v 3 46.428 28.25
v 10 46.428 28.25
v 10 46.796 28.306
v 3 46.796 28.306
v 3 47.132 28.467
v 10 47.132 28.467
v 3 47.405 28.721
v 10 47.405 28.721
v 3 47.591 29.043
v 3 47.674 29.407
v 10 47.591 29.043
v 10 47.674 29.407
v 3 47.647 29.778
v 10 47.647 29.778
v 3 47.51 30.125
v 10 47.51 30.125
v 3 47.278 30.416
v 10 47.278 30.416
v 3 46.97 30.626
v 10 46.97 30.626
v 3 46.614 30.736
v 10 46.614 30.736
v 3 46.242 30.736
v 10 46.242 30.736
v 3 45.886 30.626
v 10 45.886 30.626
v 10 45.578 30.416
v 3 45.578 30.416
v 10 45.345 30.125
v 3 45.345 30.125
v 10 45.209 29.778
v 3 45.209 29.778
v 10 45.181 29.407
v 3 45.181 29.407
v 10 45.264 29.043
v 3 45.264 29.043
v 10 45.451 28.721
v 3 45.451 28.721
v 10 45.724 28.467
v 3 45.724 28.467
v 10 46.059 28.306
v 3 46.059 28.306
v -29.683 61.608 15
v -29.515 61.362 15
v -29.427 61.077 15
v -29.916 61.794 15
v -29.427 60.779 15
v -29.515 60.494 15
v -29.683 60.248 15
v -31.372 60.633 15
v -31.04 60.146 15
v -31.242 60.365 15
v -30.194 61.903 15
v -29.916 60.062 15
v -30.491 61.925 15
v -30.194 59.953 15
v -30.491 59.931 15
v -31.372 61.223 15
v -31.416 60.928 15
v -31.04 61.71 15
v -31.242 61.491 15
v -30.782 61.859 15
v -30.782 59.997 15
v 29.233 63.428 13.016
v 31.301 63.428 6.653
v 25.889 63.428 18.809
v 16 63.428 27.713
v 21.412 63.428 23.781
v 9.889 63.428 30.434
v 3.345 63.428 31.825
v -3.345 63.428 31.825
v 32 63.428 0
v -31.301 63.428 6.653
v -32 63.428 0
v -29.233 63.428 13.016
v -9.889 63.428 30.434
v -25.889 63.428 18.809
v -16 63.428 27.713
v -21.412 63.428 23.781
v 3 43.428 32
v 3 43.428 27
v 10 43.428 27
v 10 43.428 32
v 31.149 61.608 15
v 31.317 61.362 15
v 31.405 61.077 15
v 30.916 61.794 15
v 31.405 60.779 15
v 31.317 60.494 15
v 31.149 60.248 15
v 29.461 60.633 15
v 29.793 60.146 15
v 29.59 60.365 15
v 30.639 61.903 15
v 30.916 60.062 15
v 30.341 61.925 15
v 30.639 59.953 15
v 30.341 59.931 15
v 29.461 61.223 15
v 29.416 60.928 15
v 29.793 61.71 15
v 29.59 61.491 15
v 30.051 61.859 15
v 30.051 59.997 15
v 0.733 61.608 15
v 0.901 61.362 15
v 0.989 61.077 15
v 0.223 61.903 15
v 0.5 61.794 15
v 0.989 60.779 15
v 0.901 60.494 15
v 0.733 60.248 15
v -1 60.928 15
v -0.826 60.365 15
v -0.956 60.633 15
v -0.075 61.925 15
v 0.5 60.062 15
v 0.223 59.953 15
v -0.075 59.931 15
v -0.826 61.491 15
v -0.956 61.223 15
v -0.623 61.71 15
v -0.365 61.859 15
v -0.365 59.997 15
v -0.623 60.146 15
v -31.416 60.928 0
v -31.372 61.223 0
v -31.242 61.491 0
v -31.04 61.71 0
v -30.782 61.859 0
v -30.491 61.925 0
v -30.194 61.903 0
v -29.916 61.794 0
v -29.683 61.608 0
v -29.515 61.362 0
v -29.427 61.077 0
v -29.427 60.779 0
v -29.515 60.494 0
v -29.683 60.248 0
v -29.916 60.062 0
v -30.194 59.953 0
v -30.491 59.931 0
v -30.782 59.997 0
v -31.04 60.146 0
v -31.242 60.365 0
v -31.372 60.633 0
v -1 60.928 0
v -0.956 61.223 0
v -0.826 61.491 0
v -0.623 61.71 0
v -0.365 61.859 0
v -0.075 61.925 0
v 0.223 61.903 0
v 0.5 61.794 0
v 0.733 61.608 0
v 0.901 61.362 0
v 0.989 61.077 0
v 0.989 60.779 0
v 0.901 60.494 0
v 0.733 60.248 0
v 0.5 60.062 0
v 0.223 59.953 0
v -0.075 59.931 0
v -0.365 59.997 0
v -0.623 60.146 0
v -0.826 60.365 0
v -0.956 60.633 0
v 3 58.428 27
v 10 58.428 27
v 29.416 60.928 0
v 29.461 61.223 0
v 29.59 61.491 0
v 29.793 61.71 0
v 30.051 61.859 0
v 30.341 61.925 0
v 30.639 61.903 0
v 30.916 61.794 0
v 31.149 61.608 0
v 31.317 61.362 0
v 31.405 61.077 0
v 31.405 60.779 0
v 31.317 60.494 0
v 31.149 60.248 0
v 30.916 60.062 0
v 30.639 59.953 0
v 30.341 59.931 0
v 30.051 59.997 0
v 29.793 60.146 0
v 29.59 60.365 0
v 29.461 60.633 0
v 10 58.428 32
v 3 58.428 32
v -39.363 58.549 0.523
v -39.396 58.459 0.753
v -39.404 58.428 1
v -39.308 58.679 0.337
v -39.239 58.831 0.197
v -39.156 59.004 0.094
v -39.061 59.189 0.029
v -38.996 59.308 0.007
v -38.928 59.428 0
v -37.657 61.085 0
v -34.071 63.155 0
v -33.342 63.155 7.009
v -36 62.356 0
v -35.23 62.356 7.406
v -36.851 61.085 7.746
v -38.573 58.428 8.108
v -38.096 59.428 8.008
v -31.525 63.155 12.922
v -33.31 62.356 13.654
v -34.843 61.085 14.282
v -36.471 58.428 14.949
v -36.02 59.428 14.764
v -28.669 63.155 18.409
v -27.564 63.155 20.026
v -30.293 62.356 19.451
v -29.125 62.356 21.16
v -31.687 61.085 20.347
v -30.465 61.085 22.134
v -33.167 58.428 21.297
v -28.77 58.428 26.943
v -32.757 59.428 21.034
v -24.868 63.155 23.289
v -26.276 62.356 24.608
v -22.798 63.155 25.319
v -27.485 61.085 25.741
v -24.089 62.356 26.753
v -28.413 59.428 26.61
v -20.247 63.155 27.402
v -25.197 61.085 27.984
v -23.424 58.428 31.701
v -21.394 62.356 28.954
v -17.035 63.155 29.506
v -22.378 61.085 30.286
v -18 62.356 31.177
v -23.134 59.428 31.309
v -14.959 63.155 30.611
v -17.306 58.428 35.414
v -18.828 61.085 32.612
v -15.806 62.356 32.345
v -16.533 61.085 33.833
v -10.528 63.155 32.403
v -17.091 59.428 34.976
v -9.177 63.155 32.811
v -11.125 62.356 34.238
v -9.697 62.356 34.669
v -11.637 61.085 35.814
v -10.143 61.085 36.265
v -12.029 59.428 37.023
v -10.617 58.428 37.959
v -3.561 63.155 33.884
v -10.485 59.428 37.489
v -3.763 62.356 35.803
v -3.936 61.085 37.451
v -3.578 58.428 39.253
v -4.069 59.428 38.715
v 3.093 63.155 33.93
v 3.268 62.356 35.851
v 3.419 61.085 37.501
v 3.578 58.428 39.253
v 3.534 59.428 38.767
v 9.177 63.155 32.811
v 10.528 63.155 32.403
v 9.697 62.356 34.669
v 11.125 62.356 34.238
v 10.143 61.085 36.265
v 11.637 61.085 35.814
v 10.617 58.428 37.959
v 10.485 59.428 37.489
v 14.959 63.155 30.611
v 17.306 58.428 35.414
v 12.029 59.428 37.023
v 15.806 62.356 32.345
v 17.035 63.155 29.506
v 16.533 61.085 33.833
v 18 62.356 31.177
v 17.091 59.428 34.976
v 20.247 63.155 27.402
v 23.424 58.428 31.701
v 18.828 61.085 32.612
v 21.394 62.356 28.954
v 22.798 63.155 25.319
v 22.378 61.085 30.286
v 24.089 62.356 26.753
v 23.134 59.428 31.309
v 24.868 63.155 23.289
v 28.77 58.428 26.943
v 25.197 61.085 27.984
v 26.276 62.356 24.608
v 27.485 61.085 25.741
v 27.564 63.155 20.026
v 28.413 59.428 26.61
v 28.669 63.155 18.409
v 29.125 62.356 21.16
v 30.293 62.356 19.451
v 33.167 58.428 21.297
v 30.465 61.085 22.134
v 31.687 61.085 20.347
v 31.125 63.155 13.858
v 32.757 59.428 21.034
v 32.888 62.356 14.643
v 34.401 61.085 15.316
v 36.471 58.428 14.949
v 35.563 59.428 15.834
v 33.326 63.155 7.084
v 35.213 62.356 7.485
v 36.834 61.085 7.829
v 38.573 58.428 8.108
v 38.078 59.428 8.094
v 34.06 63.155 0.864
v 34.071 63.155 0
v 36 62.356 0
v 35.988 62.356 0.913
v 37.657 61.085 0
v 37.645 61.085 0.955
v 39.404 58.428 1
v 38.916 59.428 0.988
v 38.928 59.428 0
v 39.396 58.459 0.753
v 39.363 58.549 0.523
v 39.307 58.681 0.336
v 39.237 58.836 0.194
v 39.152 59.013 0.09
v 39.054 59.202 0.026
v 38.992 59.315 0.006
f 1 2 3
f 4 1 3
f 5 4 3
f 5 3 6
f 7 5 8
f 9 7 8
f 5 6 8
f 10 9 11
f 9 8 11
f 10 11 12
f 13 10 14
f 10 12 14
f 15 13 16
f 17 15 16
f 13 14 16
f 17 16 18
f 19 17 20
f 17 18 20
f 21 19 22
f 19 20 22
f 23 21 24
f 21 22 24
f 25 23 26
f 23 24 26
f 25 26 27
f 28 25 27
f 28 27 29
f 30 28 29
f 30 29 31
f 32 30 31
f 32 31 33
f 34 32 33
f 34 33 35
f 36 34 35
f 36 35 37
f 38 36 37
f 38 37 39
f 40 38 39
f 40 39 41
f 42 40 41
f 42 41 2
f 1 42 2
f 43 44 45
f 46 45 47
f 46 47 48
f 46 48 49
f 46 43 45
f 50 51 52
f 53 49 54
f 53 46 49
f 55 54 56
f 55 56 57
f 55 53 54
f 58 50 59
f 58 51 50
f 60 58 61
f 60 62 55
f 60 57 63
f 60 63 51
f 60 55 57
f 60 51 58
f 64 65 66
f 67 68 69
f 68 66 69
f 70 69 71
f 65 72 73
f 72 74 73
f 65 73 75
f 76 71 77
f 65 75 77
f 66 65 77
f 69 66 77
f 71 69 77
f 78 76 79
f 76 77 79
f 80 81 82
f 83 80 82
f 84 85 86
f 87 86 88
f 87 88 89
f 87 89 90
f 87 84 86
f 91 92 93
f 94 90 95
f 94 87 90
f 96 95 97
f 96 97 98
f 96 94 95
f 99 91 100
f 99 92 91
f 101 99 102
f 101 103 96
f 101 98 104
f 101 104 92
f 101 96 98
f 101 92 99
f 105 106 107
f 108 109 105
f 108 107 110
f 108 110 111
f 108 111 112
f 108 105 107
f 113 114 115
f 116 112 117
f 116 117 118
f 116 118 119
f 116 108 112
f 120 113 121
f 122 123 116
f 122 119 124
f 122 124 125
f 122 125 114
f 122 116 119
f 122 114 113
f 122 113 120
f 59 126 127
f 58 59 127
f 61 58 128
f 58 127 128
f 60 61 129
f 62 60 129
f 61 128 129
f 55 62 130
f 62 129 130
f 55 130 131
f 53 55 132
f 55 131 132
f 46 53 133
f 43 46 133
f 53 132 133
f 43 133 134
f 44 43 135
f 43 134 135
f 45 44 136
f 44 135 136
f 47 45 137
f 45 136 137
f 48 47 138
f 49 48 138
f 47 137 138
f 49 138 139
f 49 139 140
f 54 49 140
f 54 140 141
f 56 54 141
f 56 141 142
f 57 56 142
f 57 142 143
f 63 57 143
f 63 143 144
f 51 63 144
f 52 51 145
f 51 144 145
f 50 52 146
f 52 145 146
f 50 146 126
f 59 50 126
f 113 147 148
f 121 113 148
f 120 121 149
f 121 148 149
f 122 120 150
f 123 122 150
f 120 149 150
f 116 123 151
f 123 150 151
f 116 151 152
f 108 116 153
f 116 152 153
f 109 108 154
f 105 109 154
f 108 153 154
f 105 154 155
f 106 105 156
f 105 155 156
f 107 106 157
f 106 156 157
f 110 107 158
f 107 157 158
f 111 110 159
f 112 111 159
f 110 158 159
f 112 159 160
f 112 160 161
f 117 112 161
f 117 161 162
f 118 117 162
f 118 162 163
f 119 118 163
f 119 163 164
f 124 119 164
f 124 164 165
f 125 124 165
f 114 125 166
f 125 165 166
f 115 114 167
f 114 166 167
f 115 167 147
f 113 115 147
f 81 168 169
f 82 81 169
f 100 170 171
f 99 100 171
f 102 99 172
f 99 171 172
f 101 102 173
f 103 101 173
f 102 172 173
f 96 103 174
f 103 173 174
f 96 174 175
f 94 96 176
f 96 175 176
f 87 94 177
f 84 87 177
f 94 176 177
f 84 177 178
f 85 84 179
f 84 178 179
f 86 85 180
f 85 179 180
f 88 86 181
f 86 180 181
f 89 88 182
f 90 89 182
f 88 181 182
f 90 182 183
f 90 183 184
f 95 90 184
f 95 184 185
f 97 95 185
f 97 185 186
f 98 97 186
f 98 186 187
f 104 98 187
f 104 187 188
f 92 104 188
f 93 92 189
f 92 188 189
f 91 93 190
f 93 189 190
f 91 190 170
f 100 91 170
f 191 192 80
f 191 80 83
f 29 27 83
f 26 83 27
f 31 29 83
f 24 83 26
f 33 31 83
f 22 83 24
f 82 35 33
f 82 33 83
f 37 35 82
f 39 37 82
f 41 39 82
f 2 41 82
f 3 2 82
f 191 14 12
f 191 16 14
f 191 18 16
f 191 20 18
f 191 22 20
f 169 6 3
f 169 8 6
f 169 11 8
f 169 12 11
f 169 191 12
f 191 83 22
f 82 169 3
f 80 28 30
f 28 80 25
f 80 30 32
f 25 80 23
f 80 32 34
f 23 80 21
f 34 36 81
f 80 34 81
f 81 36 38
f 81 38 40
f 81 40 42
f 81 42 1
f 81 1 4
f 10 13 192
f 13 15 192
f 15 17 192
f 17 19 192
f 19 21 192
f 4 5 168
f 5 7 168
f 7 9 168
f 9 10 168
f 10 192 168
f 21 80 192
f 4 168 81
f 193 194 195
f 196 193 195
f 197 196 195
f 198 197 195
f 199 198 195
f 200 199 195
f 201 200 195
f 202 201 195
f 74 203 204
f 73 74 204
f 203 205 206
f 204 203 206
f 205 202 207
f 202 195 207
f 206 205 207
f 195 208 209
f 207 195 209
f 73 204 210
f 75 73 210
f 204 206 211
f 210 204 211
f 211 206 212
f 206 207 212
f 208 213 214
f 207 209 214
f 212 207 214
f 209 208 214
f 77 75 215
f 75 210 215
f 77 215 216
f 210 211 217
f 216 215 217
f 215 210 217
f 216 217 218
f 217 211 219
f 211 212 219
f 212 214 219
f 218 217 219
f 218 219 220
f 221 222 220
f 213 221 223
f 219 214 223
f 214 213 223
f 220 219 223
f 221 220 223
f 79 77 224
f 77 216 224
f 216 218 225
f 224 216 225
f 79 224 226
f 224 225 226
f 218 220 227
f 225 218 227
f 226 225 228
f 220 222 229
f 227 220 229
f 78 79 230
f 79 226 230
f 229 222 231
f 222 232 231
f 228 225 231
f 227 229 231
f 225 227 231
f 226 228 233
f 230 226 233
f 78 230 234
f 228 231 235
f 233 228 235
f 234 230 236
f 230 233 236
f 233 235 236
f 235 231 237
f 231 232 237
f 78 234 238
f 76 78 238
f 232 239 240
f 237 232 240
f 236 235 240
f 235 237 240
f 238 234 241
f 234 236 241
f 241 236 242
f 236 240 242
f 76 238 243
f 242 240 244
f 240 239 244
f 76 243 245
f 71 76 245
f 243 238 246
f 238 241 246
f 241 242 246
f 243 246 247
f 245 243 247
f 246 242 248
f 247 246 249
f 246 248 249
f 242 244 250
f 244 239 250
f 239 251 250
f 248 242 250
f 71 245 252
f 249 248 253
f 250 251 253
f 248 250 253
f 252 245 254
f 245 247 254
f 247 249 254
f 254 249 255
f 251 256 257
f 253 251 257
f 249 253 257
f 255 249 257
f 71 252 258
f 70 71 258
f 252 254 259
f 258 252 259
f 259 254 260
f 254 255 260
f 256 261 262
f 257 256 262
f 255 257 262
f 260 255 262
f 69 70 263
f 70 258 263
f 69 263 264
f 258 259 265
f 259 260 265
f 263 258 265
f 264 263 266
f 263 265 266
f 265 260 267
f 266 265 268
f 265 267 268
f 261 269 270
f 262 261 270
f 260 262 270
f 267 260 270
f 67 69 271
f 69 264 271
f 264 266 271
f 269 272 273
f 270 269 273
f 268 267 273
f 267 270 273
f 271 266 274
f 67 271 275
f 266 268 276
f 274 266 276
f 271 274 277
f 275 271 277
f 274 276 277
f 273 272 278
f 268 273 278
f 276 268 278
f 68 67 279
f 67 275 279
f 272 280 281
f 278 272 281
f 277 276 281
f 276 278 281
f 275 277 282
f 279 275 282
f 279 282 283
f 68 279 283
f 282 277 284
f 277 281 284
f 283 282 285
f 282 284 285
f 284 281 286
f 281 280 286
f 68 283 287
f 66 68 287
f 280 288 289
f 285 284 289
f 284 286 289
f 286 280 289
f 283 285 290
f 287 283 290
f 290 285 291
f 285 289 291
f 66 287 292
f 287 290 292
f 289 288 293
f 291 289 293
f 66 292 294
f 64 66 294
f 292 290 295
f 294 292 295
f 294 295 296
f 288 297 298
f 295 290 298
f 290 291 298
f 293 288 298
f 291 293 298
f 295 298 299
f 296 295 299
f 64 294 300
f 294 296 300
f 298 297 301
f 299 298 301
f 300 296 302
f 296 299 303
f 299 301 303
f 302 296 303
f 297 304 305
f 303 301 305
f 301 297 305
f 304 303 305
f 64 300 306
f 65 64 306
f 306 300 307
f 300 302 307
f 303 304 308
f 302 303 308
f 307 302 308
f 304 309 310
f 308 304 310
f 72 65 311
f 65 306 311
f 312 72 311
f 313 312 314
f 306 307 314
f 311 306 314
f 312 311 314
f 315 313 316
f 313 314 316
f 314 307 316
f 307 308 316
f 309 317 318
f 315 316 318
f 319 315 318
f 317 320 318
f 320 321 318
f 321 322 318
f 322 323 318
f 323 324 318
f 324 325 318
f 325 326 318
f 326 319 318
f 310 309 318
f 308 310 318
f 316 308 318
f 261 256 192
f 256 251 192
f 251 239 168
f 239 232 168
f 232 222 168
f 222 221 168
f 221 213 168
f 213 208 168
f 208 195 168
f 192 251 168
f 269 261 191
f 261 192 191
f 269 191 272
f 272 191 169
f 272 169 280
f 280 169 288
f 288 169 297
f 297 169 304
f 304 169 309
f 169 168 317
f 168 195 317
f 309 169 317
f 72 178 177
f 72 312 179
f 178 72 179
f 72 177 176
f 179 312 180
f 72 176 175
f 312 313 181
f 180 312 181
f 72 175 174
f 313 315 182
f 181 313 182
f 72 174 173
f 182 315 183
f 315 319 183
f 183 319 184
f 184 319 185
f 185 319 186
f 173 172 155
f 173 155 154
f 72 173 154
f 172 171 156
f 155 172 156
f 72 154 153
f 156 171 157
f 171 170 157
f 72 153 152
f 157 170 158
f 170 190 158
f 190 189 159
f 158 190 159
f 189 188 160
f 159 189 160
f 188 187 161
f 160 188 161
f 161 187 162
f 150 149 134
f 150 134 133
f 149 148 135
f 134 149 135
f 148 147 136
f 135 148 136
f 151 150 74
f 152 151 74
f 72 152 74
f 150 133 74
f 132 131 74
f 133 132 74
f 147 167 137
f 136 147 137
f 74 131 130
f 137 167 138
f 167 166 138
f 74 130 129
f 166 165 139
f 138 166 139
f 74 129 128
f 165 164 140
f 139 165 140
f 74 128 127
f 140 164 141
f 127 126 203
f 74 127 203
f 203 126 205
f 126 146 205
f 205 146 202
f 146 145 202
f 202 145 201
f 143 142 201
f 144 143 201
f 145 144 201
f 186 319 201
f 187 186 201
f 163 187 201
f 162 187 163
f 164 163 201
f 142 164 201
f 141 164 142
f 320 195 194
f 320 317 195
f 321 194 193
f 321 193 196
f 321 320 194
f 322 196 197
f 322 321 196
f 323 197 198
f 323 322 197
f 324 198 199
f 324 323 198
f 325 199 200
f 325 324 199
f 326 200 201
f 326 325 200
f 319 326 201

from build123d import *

# Parameters (mm, degrees)
CUT_EXTRUDE3_DEPTH           = 60
CUT_EXTRUDE5_DEPTH           = 2
CUT_EXTRUDE5_DEPTH_BACK      = 30
SKETCH9_R                    = 38
SKETCH9_R_2                  = 23
SKETCH19_W                   = 12
SKETCH19_H                   = 36.5
CUT_REVOLVE2_ANGLE           = 65
CUT_REVOLVE2_OTHER_WAY_ANGLE = 65
SKETCH21_W                   = 3.25
SKETCH21_H                   = 4
BOSS_EXTRUDE3_DEPTH          = 1.35
CIRPATTERN1_COUNT            = 5
CUT_EXTRUDE9_START           = -5
CUT_EXTRUDE9_DEPTH           = 5
SKETCH23_R                   = 10.5
CUT_EXTRUDE10_DEPTH          = 10
SKETCH24_W                   = 15
SKETCH24_H                   = 8
BOSS_EXTRUDE4_DEPTH          = 8
SKETCH26_W                   = 10
SKETCH26_H                   = 6
CUT_EXTRUDE11_DEPTH          = 10
SKETCH27_W                   = 4
SKETCH27_H                   = 5
CUT_EXTRUDE12_DEPTH          = 5
CUT_EXTRUDE14_DEPTH          = 2
CUT_EXTRUDE14_DEPTH_BACK     = 30
SKETCH29_R                   = 1
CUT_EXTRUDE15_DEPTH          = 15
FILLET1_R                    = 6
FILLET2_R                    = 8
INTERSECT1_DEPTH             = 58.427876097
SKETCH31_W                   = 7
SKETCH31_H                   = 5
BOSS_EXTRUDE7_DEPTH          = 15
SKETCH32_R                   = 1.25
CUT_EXTRUDE16_DEPTH          = 7.5
FILLET3_R                    = 1


# Read off the part's stored shape, not the designer's step: Cut-Extrude9, Intersect1
with BuildPart() as part:
    # Sketch1 → Revolve1 (revolve)
    with BuildSketch(Plane.XY, mode=Mode.PRIVATE) as revolve1_sk:
        with BuildLine():
            Line((0, 63.427876097), (32, 63.427876097))
            ThreePointArc((32, 63.427876097), (37.656854249, 61.084730346), (40, 55.427876097))
            Line((40, 55.427876097), (40, 28.846818009))
            ThreePointArc((40, 28.846818009), (38.792081772, 24.082439968), (35.460140376, 20.469057744))
            Line((35.460140376, 20.469057744), (28.539859624, 15.958818353))
            ThreePointArc((28.539859624, 15.958818353), (25.207918228, 12.345436129), (24, 7.581058088))
            Line((24, 7.581058088), (24, 3.25))
            Line((24, 3.25), (24.35, 3))
            Line((24.35, 3), (24.35, 0))
            Line((24.35, 0), (22.5, 0))
            Line((22.5, 0), (22.5, 12.5))
            ThreePointArc((22.5, 12.5), (22.353553391, 12.853553391), (22, 13))
            Line((22, 13), (0, 13))
            Line((0, 13), (0, 63.427876097))
        make_face()
    revolve(revolve1_sk.sketch.rotate(Axis((0, 0, 0), (0, 1, 0)), 90), axis=Axis((0, 0, 0), (0, 1, 0)))

    # Sketch11 → Cut-Extrude3 (cut)
    with BuildSketch(Plane(origin=(0, 13, 0), x_dir=(-1, 0, 0), z_dir=(0, -1, 0))):
        with BuildLine():
            Line((-21, 0), (21, 0))
            ThreePointArc((21, 0), (0, 21), (-21, 0))
        make_face()
    extrude(amount=-CUT_EXTRUDE3_DEPTH, mode=Mode.SUBTRACT)

    # Sketch9 → Cut-Extrude5 (cut, two sides: drawn at the far end of the back side and taken through both)
    with BuildSketch(Plane(origin=(0, 55.427876097, 0), x_dir=(1, 0, 0), z_dir=(0, 1, 0)).offset(-CUT_EXTRUDE5_DEPTH_BACK)):
        with Locations(Location((0, 0, 0), (0, 0, 270))):
            Circle(SKETCH9_R)
        with Locations(Location((0, 0, 0), (0, 0, 270))):
            Circle(SKETCH9_R_2, mode=Mode.SUBTRACT)
    extrude(amount=CUT_EXTRUDE5_DEPTH + CUT_EXTRUDE5_DEPTH_BACK, mode=Mode.SUBTRACT)

    # Sketch19 → Cut-Revolve2 (revolve, cut)
    with BuildSketch(Plane(origin=(0, 0, 0), x_dir=(0, 0, -1), z_dir=(1, 0, 0))):
        with Locations((-41.064715832, 37.177876097)):
            Rectangle(SKETCH19_W, SKETCH19_H)
    revolve(axis=Axis((0, 0, 0), (0, 1, 0)), revolution_arc=CUT_REVOLVE2_ANGLE, mode=Mode.SUBTRACT)

    # Sketch19 → Cut-Revolve2 other way (revolve, cut)
    with BuildSketch(Plane(origin=(0, 0, 0), x_dir=(0, 0, -1), z_dir=(1, 0, 0))):
        with Locations((-41.064715832, 37.177876097)):
            Rectangle(SKETCH19_W, SKETCH19_H)
    revolve(axis=Axis((0, 0, 0), (0, -1, 0)), revolution_arc=CUT_REVOLVE2_OTHER_WAY_ANGLE, mode=Mode.SUBTRACT)

    # Sketch21 → Boss-Extrude3 (add)
    with BuildSketch(Plane(origin=(0, 0, 22.5), x_dir=(-1, 0, 0), z_dir=(0, 0, -1))):
        with Locations((0, 2)):
            Rectangle(SKETCH21_W, SKETCH21_H)
    boss_extrude3 = extrude(amount=BOSS_EXTRUDE3_DEPTH)

    # CirPattern1: Boss-Extrude3 ×5 about axis
    cirpattern1_axis = Axis((0, 0, 0), (0, 1, 0))
    for i in range(1, CIRPATTERN1_COUNT):
        add(boss_extrude3.rotate(cirpattern1_axis, i * 360 / CIRPATTERN1_COUNT))

    # Cut-Extrude9 outline → Cut-Extrude9 (cut)
    with BuildSketch(Plane(origin=(0, 63.427876097, 0), x_dir=(1, 0, 0), z_dir=(0, 1, 0)).offset(CUT_EXTRUDE9_START)):
        with BuildLine():
            ThreePointArc((40, 0), (0, 40), (-40, 0))
            Line((-40, 0), (-21, 0))
            ThreePointArc((-21, 0), (0, 21), (21, 0))
            Line((21, 0), (40, 0))
        make_face()
    extrude(amount=CUT_EXTRUDE9_DEPTH, mode=Mode.SUBTRACT)

    # Sketch23 → Cut-Extrude10 (cut)
    with BuildSketch(Plane(origin=(0, 0, -40), x_dir=(-1, 0, 0), z_dir=(0, 0, -1))):
        with Locations((0, 42.137876097)):
            Circle(SKETCH23_R)
    extrude(amount=-CUT_EXTRUDE10_DEPTH, mode=Mode.SUBTRACT)

    # Sketch24 → Boss-Extrude4 (add)
    with BuildSketch(Plane(origin=(0, 58.427876097, 0), x_dir=(1, 0, 0), z_dir=(0, 1, 0))):
        with Locations((0, 30)):
            Rectangle(SKETCH24_W, SKETCH24_H)
    extrude(amount=-BOSS_EXTRUDE4_DEPTH)

    # Sketch26 → Cut-Extrude11 (cut)
    with BuildSketch(Plane(origin=(0, 58.427876097, 0), x_dir=(1, 0, 0), z_dir=(0, 1, 0))):
        with Locations((0, 30)):
            Rectangle(SKETCH26_W, SKETCH26_H)
    extrude(amount=-CUT_EXTRUDE11_DEPTH, mode=Mode.SUBTRACT)

    # Sketch27 → Cut-Extrude12 (cut)
    with BuildSketch(Plane(origin=(7.5, 0, 0), x_dir=(0, 0, -1), z_dir=(1, 0, 0))):
        with Locations((30, 53.927876097)):
            Rectangle(SKETCH27_W, SKETCH27_H)
    extrude(amount=-CUT_EXTRUDE12_DEPTH, mode=Mode.SUBTRACT)

    # Sketch28 → Cut-Extrude14 (cut, two sides: drawn at the far end of the back side and taken through both)
    with BuildSketch(Plane(origin=(0, 55.427876097, 0), x_dir=(1, 0, 0), z_dir=(0, 1, 0)).offset(-CUT_EXTRUDE14_DEPTH_BACK)):
        with BuildLine():
            Line((-22.912878475, -2), (22.912878475, -2))
            ThreePointArc((22.912878475, -2), (0, -23), (-22.912878475, -2))
        make_face()
    extrude(amount=CUT_EXTRUDE14_DEPTH + CUT_EXTRUDE14_DEPTH_BACK, mode=Mode.SUBTRACT)

    # Sketch29 → Cut-Extrude15 (cut)
    with BuildSketch(Plane(origin=(0, 0, 0), x_dir=(-1, 0, 0), z_dir=(0, 0, -1))):
        with Locations((-30.416198487, 60.927876097)):
            Circle(SKETCH29_R)
        with Locations((30.416198487, 60.927876097)):
            Circle(SKETCH29_R)
        with Locations((0, 60.927876097)):
            Circle(SKETCH29_R)
    extrude(amount=-CUT_EXTRUDE15_DEPTH, mode=Mode.SUBTRACT)

    # Fillet1
    fillet1_edges = [part.edges().sort_by_distance(p)[0] for p in [
        (21, 35.713938048, 0),
        (-21, 35.713938048, 0),
    ]]
    fillet(fillet1_edges, radius=FILLET1_R)

    # Fillet2
    fillet2_edges = [part.edges().sort_by_distance(p)[0] for p in [
        (-22.912878475, 41.427876097, 2),
        (22.912878475, 41.427876097, 2),
    ]]
    fillet(fillet2_edges, radius=FILLET2_R)

    # Intersect1 outline → Intersect1 (cut)
    with BuildSketch(Plane(origin=(0, 0, 0), x_dir=(1, 0, 0), z_dir=(0, 1, 0))):
        with BuildLine():
            Line((-37.508702776, -13.895942431), (-42, -15.355253362))
            Line((-42, -15.355253362), (-42, -41))
            Line((-42, -41), (42, -41))
            Line((42, -41), (42, -15.355253362))
            Line((42, -15.355253362), (37.508702776, -13.895942431))
            ThreePointArc((37.508702776, -13.895942431), (0, 40), (-37.508702776, -13.895942431))
        make_face()
        with BuildLine():
            ThreePointArc((19.246817919, 8.4), (18.767687244, 2.713664655), (13.747727085, 0))
            Line((13.747727085, 0), (-13.747727085, 0))
            ThreePointArc((-13.747727085, 0), (-18.767687244, 2.713664655), (-19.246817919, 8.4))
            ThreePointArc((-19.246817919, 8.4), (0, 21), (19.246817919, 8.4))
        make_face(mode=Mode.SUBTRACT)
    extrude(amount=INTERSECT1_DEPTH, mode=Mode.SUBTRACT)

    # Sketch31 → Boss-Extrude7 (add)
    with BuildSketch(Plane(origin=(0, 58.427876097, 0), x_dir=(1, 0, 0), z_dir=(0, 1, 0))):
        with Locations((6.5, -29.5)):
            Rectangle(SKETCH31_W, SKETCH31_H)
    extrude(amount=-BOSS_EXTRUDE7_DEPTH)

    # Sketch32 → Cut-Extrude16 (cut)
    with BuildSketch(Plane(origin=(10, 0, 0), x_dir=(0, 0, -1), z_dir=(1, 0, 0))):
        with Locations((-29.5, 46.427876097)):
            Circle(SKETCH32_R)
    extrude(amount=-CUT_EXTRUDE16_DEPTH, mode=Mode.SUBTRACT)

    # Fillet3
    fillet3_edges = [part.edges().sort_by_distance(p)[0] for p in [
        (0, 58.427876097, 0),
    ]]
    fillet(fillet3_edges, radius=FILLET3_R)


solid = part.part
